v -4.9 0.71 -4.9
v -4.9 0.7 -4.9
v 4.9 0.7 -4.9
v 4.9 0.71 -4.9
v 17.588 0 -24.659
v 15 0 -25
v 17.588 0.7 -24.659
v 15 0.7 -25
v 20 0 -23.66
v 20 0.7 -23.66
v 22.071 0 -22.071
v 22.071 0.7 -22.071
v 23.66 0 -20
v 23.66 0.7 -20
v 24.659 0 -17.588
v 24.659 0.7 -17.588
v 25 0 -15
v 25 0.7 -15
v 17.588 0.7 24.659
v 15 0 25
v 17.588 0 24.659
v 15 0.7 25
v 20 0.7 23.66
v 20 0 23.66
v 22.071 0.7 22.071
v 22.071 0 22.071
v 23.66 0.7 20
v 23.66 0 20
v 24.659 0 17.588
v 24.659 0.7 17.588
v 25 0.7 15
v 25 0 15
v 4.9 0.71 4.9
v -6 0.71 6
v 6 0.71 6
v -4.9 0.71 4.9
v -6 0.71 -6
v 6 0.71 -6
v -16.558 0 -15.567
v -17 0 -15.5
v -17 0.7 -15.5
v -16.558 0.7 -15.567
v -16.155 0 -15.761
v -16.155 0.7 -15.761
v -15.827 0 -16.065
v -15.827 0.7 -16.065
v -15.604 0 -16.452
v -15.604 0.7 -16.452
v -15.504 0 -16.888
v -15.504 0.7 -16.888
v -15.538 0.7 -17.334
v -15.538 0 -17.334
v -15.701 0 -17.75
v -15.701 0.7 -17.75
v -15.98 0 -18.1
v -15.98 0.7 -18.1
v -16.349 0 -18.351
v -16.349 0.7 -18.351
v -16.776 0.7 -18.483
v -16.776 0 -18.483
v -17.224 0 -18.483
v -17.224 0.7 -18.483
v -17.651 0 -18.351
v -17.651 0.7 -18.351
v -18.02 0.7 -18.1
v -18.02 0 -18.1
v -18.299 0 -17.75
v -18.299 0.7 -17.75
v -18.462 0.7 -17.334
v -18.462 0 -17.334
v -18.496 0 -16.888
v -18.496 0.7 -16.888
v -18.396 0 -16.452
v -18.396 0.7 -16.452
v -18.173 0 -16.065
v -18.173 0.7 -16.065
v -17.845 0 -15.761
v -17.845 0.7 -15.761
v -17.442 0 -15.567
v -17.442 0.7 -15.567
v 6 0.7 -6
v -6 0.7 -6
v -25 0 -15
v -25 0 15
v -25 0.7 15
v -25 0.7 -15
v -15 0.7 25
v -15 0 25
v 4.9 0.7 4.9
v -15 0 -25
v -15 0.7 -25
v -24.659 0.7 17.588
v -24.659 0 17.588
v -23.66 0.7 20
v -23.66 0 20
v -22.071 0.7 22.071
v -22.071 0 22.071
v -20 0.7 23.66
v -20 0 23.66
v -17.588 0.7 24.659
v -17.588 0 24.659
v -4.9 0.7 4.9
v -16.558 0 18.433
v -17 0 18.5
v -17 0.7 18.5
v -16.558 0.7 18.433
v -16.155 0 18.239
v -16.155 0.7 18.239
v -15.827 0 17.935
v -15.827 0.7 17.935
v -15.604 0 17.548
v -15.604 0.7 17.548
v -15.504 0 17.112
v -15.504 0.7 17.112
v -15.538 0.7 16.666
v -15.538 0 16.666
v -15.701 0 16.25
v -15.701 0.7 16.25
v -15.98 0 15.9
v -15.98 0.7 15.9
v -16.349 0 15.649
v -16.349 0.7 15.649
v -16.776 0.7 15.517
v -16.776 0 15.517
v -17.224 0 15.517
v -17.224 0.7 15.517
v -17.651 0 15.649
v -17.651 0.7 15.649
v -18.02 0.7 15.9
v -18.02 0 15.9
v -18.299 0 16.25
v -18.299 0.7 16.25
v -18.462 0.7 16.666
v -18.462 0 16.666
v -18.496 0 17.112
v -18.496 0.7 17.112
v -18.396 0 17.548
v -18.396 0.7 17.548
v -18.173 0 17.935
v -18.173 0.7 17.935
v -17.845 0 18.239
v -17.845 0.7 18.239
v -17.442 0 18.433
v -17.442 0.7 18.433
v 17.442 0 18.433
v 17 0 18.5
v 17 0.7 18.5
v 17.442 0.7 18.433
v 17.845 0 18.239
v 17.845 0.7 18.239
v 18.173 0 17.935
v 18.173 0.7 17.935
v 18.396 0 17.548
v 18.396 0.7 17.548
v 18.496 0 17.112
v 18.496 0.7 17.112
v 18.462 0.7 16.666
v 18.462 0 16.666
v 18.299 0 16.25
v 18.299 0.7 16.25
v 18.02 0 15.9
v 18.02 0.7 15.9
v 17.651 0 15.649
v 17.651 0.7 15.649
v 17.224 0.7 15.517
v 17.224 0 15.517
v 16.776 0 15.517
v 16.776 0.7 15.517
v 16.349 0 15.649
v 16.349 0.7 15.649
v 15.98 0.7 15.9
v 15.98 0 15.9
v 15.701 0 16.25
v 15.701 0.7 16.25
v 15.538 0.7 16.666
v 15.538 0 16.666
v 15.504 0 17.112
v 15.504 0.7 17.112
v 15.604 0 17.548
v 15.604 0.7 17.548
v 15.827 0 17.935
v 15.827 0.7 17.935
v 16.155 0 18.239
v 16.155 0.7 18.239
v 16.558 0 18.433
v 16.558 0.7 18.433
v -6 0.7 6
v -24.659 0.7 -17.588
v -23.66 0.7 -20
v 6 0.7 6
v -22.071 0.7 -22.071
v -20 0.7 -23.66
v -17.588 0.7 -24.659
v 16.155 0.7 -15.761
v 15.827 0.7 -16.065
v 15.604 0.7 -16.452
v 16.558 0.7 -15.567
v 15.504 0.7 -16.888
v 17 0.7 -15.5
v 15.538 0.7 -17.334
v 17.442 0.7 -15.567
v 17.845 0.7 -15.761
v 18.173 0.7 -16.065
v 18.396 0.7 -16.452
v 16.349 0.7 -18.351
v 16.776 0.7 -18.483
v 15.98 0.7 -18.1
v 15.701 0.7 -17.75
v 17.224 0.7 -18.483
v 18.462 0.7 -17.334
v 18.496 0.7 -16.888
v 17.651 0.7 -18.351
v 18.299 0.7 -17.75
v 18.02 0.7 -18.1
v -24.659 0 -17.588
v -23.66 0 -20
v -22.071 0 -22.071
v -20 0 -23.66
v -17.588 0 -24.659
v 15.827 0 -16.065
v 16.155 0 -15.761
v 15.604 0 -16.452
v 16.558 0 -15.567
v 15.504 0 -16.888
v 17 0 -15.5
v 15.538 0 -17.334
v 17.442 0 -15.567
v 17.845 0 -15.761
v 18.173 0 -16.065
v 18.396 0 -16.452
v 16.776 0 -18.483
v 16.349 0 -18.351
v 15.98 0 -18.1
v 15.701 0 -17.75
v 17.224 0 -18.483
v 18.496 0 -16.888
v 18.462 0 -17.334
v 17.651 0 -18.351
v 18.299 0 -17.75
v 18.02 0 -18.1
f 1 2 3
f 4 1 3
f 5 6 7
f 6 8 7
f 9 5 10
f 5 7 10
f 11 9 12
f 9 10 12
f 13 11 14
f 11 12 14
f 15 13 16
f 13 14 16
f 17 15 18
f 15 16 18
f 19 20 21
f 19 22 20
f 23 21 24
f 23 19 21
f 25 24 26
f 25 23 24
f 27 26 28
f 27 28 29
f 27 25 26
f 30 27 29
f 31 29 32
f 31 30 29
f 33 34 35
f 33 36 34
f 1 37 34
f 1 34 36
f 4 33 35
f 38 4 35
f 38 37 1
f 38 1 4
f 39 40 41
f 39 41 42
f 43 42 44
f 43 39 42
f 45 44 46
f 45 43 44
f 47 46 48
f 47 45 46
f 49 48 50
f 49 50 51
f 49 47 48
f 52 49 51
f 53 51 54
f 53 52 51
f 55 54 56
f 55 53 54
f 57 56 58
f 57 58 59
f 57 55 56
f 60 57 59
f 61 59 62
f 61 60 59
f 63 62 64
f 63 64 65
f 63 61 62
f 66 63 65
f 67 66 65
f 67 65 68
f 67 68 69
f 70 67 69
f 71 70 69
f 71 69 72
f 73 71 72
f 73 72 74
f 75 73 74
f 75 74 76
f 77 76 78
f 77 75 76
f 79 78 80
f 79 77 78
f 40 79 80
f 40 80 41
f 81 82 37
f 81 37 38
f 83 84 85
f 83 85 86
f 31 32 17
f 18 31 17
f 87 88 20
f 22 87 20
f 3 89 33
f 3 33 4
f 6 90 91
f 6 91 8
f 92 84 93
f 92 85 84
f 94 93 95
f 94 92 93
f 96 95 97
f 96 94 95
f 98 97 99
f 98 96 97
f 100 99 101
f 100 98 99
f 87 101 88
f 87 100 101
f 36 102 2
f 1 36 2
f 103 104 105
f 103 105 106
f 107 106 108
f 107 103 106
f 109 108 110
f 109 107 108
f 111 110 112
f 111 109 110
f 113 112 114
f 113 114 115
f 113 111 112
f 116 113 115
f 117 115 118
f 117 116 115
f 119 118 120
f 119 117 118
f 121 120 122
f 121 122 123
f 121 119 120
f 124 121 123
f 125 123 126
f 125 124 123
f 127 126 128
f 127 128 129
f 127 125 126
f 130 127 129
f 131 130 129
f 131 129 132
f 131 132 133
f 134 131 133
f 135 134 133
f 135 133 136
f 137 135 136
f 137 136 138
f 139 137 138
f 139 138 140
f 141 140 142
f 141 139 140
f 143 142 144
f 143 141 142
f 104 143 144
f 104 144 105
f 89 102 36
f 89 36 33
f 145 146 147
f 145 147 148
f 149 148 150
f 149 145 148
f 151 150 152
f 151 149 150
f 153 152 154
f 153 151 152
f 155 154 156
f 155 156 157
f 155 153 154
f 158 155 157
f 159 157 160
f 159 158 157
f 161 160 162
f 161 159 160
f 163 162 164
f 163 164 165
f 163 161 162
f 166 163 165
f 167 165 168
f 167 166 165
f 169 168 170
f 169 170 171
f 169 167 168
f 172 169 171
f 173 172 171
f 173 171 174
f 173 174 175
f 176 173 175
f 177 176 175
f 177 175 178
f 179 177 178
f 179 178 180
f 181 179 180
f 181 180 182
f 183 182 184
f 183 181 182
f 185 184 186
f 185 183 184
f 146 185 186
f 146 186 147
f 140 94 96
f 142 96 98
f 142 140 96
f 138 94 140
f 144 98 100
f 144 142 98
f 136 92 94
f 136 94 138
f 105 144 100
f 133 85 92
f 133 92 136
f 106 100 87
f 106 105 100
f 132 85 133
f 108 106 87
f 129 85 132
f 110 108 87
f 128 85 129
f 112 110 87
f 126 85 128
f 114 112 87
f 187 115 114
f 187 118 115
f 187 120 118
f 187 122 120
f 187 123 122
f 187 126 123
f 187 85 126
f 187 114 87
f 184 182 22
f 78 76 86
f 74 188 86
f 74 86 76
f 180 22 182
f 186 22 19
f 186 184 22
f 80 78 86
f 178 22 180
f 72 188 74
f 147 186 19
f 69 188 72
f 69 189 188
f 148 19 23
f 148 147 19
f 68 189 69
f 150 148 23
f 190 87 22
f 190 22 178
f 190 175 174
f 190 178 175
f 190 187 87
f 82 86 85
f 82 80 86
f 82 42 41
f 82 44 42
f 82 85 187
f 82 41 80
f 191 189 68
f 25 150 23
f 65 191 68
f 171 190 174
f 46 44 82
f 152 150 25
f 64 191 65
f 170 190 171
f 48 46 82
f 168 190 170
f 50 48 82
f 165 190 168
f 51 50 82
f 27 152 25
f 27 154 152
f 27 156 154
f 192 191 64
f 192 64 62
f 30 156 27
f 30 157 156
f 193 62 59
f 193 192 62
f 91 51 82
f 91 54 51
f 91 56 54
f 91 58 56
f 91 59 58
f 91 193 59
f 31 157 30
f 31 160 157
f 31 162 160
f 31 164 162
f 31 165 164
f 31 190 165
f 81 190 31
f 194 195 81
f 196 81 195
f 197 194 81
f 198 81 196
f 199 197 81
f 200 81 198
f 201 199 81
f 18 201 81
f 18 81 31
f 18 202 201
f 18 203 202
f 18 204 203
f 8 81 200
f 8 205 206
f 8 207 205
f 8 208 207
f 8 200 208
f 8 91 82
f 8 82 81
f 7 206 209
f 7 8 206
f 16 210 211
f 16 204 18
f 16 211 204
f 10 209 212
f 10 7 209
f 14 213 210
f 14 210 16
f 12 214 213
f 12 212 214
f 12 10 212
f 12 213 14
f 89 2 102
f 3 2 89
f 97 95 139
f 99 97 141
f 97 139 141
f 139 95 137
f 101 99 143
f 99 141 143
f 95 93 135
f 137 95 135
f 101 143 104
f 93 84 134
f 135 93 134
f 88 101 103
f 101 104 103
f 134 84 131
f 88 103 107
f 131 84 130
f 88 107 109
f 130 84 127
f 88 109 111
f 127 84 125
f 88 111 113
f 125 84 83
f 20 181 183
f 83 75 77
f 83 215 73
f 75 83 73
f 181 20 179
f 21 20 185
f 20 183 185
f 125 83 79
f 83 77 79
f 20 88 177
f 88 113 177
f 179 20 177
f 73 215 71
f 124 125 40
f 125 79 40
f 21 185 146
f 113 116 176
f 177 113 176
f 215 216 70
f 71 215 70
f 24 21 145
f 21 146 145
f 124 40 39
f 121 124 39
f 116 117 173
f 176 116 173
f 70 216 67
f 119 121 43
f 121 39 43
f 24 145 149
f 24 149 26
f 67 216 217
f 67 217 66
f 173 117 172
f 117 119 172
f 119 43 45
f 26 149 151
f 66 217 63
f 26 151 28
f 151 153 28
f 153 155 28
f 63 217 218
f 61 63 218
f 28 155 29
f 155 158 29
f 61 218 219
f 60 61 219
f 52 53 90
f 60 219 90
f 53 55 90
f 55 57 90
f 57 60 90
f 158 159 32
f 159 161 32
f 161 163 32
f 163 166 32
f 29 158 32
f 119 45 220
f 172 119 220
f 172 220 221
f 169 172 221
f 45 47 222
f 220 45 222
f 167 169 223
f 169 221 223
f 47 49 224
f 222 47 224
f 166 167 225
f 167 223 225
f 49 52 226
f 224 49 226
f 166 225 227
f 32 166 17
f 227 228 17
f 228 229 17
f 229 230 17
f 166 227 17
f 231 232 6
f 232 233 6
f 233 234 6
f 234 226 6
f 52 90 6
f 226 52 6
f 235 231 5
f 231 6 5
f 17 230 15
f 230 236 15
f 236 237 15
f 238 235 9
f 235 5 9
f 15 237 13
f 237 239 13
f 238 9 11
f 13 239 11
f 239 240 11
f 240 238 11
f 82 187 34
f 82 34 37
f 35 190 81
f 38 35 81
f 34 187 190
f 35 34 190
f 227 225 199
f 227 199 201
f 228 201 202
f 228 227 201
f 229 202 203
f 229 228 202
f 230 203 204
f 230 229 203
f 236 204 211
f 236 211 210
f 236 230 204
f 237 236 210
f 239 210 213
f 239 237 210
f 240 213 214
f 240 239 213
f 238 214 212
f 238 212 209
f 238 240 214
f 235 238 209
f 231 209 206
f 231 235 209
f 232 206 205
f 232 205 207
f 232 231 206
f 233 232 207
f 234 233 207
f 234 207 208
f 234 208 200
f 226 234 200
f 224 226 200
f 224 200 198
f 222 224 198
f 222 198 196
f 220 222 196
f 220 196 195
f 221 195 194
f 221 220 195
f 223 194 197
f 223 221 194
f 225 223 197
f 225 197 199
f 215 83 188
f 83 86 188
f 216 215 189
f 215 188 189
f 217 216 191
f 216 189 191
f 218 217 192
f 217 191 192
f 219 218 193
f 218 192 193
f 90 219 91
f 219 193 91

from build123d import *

# Parameters (mm, degrees)
SKETCH1_W           = 50
SKETCH1_H           = 50
SKETCH1_R           = 1.5
BOSS_EXTRUDE1_DEPTH = 0.7
FILLET1_R           = 10
SKETCH2_W           = 12
SKETCH2_H           = 12
SKETCH2_W_2         = 9.8
SKETCH2_H_2         = 9.8
BOSS_EXTRUDE2_DEPTH = 0.01


with BuildPart() as part:
    # Sketch1 → Boss-Extrude1 (new body)
    with BuildSketch(Plane(origin=(0, 0, 0), x_dir=(1, 0, 0), z_dir=(0, 1, 0))):
        Rectangle(SKETCH1_W, SKETCH1_H)
        with Locations(Location((-17, 17, 0), (0, 0, 270))):
            Circle(SKETCH1_R, mode=Mode.SUBTRACT)
        with Locations(Location((17, 17, 0), (0, 0, 270))):
            Circle(SKETCH1_R, mode=Mode.SUBTRACT)
        with Locations(Location((17, -17, 0), (0, 0, 270))):
            Circle(SKETCH1_R, mode=Mode.SUBTRACT)
        with Locations(Location((-17, -17, 0), (0, 0, 270))):
            Circle(SKETCH1_R, mode=Mode.SUBTRACT)
    extrude(amount=BOSS_EXTRUDE1_DEPTH)

    # Fillet1
    fillet1_edges = [part.edges().sort_by_distance(p)[0] for p in [
        (-25, 0.35, -25),
        (25, 0.35, -25),
        (25, 0.35, 25),
        (-25, 0.35, 25),
    ]]
    fillet(fillet1_edges, radius=FILLET1_R)

    # Sketch2 → Boss-Extrude2 (add)
    with BuildSketch(Plane(origin=(0, 0.7, 0), x_dir=(1, 0, 0), z_dir=(0, 1, 0))):
        Rectangle(SKETCH2_W, SKETCH2_H)
        Rectangle(SKETCH2_W_2, SKETCH2_H_2, mode=Mode.SUBTRACT)
    extrude(amount=BOSS_EXTRUDE2_DEPTH)


solid = part.part
